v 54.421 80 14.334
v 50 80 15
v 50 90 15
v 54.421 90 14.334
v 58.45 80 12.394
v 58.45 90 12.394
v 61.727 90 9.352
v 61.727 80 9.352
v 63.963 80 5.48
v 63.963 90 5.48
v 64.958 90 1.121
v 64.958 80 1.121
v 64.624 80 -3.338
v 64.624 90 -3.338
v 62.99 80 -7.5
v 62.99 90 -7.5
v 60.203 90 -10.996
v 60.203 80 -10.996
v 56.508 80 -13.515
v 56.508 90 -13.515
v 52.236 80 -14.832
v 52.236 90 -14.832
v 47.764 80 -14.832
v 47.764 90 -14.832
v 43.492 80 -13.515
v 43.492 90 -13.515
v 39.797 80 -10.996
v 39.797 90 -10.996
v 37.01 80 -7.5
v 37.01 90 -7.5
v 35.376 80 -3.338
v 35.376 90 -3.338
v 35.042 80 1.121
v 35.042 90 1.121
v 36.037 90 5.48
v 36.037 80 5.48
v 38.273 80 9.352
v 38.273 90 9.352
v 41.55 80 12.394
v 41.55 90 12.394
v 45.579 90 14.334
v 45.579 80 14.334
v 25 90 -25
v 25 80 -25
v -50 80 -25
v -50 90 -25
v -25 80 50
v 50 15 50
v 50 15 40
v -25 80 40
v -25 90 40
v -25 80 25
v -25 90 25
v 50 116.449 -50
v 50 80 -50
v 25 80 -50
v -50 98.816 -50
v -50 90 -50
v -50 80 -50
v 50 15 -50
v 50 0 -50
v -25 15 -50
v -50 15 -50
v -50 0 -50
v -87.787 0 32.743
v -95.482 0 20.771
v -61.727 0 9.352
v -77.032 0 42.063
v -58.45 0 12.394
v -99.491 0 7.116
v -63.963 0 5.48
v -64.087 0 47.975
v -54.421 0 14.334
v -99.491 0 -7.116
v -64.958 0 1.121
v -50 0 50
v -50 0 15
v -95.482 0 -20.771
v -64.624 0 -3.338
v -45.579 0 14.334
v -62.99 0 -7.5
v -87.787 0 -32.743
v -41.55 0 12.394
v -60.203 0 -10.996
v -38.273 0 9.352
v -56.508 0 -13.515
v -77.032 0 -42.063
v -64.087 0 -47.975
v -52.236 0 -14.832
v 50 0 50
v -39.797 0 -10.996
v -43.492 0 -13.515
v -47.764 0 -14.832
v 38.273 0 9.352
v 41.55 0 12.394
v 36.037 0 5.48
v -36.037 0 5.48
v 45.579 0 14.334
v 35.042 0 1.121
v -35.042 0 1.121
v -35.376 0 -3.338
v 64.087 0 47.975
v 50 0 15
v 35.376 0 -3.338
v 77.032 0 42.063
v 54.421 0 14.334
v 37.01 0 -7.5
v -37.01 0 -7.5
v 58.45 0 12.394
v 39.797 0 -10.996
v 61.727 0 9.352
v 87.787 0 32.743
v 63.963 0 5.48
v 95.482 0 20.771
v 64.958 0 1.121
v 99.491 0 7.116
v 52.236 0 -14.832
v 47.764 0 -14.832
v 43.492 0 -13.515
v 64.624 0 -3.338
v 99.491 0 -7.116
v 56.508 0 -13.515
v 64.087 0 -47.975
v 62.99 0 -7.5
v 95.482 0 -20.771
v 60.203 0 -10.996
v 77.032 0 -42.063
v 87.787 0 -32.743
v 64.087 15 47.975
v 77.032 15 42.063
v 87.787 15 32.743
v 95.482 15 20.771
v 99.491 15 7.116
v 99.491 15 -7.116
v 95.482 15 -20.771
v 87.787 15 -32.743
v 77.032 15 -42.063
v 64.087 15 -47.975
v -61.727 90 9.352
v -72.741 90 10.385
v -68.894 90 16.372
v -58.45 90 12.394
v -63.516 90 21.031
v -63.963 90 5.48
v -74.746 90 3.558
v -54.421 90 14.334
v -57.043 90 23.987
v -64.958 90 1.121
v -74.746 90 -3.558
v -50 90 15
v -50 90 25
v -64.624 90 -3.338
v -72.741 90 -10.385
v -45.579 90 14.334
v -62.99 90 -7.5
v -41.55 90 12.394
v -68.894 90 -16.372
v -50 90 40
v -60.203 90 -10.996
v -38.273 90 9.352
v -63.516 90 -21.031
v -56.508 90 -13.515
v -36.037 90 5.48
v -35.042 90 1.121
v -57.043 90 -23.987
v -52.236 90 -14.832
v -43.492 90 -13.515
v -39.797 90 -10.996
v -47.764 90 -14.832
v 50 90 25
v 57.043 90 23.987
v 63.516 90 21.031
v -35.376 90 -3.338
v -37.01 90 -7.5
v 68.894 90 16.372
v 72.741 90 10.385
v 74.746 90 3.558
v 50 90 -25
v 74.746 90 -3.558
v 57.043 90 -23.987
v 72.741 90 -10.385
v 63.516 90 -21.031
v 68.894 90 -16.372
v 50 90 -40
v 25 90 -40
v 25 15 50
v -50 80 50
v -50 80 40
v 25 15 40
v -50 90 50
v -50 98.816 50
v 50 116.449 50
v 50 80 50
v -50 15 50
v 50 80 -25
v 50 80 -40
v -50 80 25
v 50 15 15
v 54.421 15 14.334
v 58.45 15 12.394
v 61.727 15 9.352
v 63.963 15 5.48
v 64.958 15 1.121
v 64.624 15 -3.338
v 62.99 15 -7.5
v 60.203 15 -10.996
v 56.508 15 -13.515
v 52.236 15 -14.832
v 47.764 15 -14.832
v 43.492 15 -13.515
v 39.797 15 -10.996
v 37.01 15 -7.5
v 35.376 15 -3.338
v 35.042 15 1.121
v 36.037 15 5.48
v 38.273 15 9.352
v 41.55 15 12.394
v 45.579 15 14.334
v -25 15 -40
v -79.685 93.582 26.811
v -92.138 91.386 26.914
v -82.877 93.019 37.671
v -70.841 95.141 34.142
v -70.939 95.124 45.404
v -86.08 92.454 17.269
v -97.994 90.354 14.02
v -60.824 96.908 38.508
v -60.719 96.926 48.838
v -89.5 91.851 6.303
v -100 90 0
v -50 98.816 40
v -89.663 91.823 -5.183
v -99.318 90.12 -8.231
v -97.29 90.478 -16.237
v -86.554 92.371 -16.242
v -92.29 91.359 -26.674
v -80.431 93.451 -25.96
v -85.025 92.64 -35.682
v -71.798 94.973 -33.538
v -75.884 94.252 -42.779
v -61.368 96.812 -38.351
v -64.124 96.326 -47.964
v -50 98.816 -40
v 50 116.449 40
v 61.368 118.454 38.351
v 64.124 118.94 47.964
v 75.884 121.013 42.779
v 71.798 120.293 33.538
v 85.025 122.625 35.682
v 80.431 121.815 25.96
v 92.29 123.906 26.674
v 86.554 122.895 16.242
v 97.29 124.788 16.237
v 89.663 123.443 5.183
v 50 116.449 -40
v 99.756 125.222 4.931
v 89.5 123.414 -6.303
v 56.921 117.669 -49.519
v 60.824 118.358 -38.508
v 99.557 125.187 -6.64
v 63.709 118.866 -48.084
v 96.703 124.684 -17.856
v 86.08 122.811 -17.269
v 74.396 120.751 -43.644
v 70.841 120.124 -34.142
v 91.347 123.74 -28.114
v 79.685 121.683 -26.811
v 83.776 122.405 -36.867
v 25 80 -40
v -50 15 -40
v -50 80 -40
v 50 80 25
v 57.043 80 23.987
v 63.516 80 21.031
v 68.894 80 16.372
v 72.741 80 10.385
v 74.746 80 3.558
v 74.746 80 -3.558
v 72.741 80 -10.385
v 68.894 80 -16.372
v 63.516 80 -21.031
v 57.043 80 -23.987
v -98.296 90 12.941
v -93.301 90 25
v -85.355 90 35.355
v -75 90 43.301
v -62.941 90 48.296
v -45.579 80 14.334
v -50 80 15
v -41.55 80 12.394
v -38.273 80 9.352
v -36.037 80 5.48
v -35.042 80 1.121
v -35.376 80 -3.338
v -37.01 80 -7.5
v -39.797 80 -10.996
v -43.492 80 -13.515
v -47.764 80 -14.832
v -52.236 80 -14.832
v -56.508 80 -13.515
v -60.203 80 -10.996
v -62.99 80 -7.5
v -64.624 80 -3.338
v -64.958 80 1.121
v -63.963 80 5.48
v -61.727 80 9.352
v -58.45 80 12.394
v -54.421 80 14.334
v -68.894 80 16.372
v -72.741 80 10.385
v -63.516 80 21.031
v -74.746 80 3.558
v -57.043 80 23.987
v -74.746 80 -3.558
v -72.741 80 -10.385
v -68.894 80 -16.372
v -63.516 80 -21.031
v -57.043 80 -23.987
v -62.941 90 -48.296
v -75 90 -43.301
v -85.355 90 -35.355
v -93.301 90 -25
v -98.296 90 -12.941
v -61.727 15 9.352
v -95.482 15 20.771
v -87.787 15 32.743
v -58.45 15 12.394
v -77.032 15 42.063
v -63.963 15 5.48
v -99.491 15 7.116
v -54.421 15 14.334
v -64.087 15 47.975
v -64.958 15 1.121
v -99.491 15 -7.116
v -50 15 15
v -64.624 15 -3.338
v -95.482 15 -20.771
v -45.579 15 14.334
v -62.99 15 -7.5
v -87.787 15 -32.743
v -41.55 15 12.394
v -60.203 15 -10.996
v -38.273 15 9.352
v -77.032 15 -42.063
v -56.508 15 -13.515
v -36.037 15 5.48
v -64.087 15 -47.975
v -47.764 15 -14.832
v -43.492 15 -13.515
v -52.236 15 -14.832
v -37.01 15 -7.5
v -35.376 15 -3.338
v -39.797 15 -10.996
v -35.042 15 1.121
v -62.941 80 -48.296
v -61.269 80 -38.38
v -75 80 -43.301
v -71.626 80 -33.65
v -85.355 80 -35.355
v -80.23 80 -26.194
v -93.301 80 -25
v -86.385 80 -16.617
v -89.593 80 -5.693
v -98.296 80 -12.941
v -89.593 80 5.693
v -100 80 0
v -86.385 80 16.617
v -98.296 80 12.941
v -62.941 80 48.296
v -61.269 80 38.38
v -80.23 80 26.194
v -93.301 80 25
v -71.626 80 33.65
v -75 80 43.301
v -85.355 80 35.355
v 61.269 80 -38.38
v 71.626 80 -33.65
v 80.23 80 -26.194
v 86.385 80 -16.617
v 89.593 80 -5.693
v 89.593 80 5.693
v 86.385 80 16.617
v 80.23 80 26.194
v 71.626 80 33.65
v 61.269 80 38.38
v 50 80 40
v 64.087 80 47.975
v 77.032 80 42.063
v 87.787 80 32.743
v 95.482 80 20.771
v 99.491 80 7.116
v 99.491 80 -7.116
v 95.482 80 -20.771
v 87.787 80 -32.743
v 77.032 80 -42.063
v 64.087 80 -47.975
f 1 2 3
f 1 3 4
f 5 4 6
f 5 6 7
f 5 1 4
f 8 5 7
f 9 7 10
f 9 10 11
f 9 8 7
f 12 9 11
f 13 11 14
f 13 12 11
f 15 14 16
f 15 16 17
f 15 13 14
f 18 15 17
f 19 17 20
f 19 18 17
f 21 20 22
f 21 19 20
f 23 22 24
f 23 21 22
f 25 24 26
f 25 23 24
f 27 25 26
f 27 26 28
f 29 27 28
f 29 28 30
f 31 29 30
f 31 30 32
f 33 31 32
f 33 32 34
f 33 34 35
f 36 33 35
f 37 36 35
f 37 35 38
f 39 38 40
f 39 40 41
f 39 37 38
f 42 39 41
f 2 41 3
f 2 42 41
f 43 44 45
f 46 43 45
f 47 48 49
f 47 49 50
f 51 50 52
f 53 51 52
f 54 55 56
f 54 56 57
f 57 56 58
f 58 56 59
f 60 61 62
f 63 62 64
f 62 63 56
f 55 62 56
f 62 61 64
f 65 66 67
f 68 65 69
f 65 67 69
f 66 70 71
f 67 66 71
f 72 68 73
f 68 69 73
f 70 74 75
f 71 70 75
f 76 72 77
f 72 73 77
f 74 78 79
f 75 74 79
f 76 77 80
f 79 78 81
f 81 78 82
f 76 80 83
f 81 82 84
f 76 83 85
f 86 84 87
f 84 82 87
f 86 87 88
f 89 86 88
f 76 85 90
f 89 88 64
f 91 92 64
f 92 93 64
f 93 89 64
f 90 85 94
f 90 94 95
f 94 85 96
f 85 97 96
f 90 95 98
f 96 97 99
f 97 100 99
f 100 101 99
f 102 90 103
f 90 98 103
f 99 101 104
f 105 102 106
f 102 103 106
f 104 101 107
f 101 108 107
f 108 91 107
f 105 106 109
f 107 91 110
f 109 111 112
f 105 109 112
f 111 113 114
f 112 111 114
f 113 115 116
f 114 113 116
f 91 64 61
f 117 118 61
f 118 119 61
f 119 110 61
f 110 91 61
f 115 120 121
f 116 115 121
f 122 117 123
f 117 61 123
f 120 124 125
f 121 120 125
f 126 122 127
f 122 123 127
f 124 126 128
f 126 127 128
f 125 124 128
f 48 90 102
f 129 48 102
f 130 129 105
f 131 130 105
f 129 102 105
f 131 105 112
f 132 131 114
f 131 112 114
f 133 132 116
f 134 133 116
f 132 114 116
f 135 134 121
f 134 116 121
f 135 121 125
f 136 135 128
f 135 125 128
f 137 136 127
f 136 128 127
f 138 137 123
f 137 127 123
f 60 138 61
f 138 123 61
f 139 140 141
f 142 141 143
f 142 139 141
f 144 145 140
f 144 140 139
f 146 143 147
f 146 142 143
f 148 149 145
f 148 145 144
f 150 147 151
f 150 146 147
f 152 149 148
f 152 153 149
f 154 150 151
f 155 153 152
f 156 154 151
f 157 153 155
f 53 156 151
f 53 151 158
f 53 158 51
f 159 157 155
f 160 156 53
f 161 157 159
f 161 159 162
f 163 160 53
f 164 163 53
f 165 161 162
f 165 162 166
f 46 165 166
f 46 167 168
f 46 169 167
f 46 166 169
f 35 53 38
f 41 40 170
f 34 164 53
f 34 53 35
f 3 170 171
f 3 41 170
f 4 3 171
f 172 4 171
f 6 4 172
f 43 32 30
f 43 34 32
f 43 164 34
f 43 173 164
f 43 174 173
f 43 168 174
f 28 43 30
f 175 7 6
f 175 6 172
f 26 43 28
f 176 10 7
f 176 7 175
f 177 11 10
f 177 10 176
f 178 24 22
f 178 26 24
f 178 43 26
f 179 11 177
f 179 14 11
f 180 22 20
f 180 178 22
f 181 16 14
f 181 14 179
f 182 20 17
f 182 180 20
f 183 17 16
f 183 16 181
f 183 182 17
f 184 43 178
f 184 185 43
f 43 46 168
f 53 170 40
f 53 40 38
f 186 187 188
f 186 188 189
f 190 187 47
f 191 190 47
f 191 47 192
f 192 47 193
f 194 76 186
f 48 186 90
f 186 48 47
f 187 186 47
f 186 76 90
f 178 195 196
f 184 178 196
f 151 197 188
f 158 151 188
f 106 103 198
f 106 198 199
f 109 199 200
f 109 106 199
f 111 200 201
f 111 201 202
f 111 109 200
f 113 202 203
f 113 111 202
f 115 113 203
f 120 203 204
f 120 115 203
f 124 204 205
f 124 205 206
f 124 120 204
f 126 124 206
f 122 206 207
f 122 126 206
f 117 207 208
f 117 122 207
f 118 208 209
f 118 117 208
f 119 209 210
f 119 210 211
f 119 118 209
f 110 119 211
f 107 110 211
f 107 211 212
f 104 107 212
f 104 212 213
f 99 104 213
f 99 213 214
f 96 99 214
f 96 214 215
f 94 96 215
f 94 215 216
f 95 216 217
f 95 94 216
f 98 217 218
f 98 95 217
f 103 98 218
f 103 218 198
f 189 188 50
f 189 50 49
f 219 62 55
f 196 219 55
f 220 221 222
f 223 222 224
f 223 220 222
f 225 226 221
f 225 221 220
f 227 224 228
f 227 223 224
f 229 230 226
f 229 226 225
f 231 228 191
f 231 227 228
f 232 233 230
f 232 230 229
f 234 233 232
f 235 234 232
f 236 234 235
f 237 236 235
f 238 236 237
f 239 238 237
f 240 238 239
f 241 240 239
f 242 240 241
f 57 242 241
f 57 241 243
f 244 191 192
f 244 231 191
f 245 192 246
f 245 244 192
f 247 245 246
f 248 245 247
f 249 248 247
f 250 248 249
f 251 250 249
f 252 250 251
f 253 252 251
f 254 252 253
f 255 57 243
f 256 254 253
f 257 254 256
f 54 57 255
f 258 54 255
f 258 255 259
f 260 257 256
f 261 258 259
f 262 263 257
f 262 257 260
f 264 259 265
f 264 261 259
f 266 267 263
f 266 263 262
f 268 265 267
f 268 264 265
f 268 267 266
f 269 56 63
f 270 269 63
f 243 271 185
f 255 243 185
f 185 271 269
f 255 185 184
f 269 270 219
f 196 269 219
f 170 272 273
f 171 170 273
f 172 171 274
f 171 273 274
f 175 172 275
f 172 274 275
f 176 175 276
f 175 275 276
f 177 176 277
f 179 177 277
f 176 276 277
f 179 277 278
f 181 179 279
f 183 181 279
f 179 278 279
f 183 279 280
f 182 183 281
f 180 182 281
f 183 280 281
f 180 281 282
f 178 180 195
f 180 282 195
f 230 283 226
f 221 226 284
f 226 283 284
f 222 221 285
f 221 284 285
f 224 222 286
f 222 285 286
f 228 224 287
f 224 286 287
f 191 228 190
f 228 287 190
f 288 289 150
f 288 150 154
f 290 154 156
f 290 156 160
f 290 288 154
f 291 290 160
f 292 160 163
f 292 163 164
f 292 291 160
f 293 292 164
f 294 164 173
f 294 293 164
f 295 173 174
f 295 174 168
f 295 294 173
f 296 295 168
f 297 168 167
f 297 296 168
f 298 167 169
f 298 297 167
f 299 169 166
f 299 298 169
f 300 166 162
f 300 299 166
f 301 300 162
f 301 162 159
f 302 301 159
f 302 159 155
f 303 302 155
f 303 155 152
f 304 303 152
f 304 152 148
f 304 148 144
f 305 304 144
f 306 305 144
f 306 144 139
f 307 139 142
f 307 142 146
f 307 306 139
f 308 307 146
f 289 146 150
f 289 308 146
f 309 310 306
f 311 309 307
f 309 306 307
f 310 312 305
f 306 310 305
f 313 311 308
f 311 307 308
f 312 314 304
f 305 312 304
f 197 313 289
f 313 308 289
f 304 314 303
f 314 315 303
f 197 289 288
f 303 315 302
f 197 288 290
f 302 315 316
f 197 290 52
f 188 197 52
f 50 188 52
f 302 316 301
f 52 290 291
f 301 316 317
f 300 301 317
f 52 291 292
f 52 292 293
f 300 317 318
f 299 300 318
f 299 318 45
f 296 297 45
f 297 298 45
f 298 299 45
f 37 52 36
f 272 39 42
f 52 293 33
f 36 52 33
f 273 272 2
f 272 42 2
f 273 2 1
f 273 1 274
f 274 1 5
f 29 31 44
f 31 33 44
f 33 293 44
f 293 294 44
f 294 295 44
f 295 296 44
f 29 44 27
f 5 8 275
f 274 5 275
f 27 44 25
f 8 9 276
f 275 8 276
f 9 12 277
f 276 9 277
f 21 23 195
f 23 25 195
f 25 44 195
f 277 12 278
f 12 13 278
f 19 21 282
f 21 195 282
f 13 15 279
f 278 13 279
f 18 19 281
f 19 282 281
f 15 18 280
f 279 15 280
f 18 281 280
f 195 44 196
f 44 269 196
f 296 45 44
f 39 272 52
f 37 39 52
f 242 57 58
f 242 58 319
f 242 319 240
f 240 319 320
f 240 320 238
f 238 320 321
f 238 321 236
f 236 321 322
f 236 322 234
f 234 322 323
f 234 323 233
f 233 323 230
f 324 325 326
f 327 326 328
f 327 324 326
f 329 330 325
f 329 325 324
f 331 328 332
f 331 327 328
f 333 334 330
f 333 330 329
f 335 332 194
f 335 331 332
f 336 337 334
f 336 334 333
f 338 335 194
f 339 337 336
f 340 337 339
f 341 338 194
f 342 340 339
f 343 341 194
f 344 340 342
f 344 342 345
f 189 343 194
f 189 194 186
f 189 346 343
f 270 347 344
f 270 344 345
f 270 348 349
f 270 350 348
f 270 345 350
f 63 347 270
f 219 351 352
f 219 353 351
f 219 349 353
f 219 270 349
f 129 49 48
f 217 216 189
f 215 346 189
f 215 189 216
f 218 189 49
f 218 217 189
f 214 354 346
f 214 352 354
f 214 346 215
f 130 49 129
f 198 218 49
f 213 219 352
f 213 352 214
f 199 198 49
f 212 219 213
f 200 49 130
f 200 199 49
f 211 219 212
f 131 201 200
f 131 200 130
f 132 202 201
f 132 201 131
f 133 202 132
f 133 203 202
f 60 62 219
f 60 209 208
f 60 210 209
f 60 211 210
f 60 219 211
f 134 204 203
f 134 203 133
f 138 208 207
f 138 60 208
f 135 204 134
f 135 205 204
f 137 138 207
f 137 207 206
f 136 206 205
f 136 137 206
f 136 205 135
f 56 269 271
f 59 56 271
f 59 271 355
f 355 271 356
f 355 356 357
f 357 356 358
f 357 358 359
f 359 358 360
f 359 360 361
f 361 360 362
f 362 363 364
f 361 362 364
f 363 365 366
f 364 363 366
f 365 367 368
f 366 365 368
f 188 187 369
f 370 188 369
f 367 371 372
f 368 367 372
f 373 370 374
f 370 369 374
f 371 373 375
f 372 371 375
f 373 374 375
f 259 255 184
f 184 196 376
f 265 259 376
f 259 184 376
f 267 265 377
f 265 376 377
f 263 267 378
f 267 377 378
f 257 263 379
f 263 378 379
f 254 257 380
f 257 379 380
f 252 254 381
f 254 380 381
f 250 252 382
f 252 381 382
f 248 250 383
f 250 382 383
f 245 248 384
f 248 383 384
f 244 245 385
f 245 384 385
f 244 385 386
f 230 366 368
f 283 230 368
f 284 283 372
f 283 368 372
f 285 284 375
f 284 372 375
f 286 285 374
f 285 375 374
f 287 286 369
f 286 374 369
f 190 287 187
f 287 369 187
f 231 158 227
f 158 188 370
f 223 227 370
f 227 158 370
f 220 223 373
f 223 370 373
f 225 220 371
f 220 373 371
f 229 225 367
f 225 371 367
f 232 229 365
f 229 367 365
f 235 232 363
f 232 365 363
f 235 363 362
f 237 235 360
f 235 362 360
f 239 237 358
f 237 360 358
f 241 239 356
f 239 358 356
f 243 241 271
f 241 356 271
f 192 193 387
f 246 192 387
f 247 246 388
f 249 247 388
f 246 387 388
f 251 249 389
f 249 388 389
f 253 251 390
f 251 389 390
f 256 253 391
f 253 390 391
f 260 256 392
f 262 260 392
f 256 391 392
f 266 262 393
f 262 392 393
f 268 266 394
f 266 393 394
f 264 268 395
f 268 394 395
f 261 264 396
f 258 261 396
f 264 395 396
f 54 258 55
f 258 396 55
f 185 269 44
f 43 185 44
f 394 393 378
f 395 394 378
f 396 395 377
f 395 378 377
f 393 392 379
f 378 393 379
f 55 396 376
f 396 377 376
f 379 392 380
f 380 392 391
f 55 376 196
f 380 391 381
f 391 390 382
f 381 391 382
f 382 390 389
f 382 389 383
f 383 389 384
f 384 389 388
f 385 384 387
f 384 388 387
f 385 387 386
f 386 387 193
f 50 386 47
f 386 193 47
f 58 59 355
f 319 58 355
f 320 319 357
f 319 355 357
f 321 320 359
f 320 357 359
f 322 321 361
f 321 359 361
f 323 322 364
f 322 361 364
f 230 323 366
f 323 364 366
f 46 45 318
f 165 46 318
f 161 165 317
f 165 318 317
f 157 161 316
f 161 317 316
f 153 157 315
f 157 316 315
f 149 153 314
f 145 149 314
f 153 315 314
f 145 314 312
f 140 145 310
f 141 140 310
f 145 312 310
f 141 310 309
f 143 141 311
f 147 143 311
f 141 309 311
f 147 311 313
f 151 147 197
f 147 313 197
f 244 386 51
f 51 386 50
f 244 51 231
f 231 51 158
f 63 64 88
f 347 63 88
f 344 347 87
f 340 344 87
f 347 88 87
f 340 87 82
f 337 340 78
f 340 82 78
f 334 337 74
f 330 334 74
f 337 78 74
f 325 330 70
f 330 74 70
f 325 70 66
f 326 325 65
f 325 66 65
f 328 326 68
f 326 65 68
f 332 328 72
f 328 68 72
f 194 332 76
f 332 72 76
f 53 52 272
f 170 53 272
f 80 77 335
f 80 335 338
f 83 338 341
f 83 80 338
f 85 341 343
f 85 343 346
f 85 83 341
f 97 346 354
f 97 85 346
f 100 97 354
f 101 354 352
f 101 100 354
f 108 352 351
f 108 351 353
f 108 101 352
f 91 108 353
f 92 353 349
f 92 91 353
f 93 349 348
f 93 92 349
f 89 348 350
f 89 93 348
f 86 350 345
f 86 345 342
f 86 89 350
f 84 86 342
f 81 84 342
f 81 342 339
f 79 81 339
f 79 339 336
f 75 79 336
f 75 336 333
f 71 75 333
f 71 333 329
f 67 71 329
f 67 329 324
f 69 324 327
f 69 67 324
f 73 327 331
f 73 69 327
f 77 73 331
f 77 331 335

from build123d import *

# Parameters (mm, degrees)
BOSS_EXTRUDE1_START     = 80
SKETCH1_R               = 15
BOSS_EXTRUDE1_DEPTH     = 10
SKETCH1_3_R             = 15
BOSS_EXTRUDE2_DEPTH     = 15
BOSS_EXTRUDE3_DEPTH     = 10
BOSS_EXTRUDE4_DEPTH     = 10
BOSS_EXTRUDE6_DEPTH     = 60
CUT_EXTRUDE1_DEPTH      = 188.082869339
CUT_EXTRUDE1_DEPTH_BACK = 188.082869339
BOSS_EXTRUDE7_START     = 10
BOSS_EXTRUDE7_DEPTH     = 10


with BuildPart() as part:
    # Sketch1 → Boss-Extrude1 (new body)
    with BuildSketch(Plane(origin=(0, 0, 0), x_dir=(1, 0, 0), z_dir=(0, 1, 0)).offset(BOSS_EXTRUDE1_START)):
        with BuildLine():
            Line((50, 50), (25, 50))
            Line((25, 50), (25, 25))
            Line((25, 25), (-50, 25))
            ThreePointArc((-50, 25), (-75, 0), (-50, -25))
            Line((-50, -25), (-50, -50))
            Line((-50, -50), (-25, -50))
            Line((-25, -50), (-25, -25))
            Line((-25, -25), (50, -25))
            ThreePointArc((50, -25), (75, 0), (50, 25))
            Line((50, 25), (50, 50))
        make_face()
        with Locations((-50, 0)):
            Circle(SKETCH1_R, mode=Mode.SUBTRACT)
        with Locations((50, 0)):
            Circle(SKETCH1_R, mode=Mode.SUBTRACT)
    extrude(amount=BOSS_EXTRUDE1_DEPTH)



with BuildPart() as body_2:
    # Sketch1<3> → Boss-Extrude2 (new body)
    with BuildSketch(Plane(origin=(0, 0, 0), x_dir=(1, 0, 0), z_dir=(0, 1, 0))):
        with BuildLine():
            ThreePointArc((-50, 50), (-100, 0), (-50, -50))
            Line((-50, -50), (50, -50))
            ThreePointArc((50, -50), (100, 0), (50, 50))
            Line((50, 50), (-50, 50))
        make_face()
        with Locations((-50, 0)):
            Circle(SKETCH1_3_R, mode=Mode.SUBTRACT)
        with Locations((50, 0)):
            Circle(SKETCH1_3_R, mode=Mode.SUBTRACT)
    extrude(amount=BOSS_EXTRUDE2_DEPTH)


with BuildPart() as part_1:
    add(part.part)

    add(body_2.part)  # Boss-Extrude3 merges body 2
    # Sketch2 → Boss-Extrude3 (add)
    with BuildSketch(Plane.XY.offset(50)):
        Polygon((50, 15), (-25, 80), (-50, 80), (25, 15), align=None)
    extrude(amount=-BOSS_EXTRUDE3_DEPTH)

    # Sketch3 → Boss-Extrude4 (add)
    with BuildSketch(Plane(origin=(0, 0, -50), x_dir=(-1, 0, 0), z_dir=(0, 0, -1))):
        Polygon((-25, 80), (50, 15), (25, 15), (-50, 80), align=None)
    extrude(amount=-BOSS_EXTRUDE4_DEPTH)

    # Sketch4 → Boss-Extrude6 (add)
    with BuildSketch(Plane(origin=(0, 90, 0), x_dir=(1, 0, 0), z_dir=(0, 1, 0))):
        with BuildLine():
            ThreePointArc((50, -50), (100, 0), (50, 50))
            Line((50, 50), (-50, 50))
            ThreePointArc((-50, 50), (-100, 0), (-50, -50))
            Line((-50, -50), (50, -50))
        make_face()
        with BuildLine():
            Line((50, -40), (-50, -40))
            ThreePointArc((-50, -40), (-90, 0), (-50, 40))
            Line((-50, 40), (50, 40))
            ThreePointArc((50, 40), (90, 0), (50, -40))
        make_face(mode=Mode.SUBTRACT)
    extrude(amount=BOSS_EXTRUDE6_DEPTH)

    # Sketch6 → Cut-Extrude1 (cut, two sides: drawn at the far end of the back side and taken through both)
    with BuildSketch(Plane.XY.offset(-CUT_EXTRUDE1_DEPTH_BACK)):
        Polygon((-639.560936873, -5.139150907), (-100, 90), (134.669192778, 131.378510228), (674.230129651, 226.517661135), (483.951827837, 1305.639534881), (-829.839238687, 1073.982722839), align=None)
    extrude(amount=CUT_EXTRUDE1_DEPTH + CUT_EXTRUDE1_DEPTH_BACK, mode=Mode.SUBTRACT)

    # Sketch7 → Boss-Extrude7 (add)
    with BuildSketch(Plane.XZ.offset(-90).offset(BOSS_EXTRUDE7_START)):
        with BuildLine():
            Line((50, -50), (-50, -50))
            ThreePointArc((-50, -50), (-85.355339059, -35.355339059), (-100, 0))
            ThreePointArc((-100, 0), (-85.355339059, 35.355339059), (-50, 50))
            Line((-50, 50), (-27.684093833, 50))
            Line((-27.684093833, 50), (50, 50))
            ThreePointArc((50, 50), (100, 0), (50, -50))
        make_face()
        with BuildLine():
            Line((-50, -40), (50, -40))
            ThreePointArc((50, -40), (90, 0), (50, 40))
            Line((50, 40), (-50, 40))
            ThreePointArc((-50, 40), (-90, 0), (-50, -40))
        make_face(mode=Mode.SUBTRACT)
    extrude(amount=-BOSS_EXTRUDE7_DEPTH)


solid = part_1.part
